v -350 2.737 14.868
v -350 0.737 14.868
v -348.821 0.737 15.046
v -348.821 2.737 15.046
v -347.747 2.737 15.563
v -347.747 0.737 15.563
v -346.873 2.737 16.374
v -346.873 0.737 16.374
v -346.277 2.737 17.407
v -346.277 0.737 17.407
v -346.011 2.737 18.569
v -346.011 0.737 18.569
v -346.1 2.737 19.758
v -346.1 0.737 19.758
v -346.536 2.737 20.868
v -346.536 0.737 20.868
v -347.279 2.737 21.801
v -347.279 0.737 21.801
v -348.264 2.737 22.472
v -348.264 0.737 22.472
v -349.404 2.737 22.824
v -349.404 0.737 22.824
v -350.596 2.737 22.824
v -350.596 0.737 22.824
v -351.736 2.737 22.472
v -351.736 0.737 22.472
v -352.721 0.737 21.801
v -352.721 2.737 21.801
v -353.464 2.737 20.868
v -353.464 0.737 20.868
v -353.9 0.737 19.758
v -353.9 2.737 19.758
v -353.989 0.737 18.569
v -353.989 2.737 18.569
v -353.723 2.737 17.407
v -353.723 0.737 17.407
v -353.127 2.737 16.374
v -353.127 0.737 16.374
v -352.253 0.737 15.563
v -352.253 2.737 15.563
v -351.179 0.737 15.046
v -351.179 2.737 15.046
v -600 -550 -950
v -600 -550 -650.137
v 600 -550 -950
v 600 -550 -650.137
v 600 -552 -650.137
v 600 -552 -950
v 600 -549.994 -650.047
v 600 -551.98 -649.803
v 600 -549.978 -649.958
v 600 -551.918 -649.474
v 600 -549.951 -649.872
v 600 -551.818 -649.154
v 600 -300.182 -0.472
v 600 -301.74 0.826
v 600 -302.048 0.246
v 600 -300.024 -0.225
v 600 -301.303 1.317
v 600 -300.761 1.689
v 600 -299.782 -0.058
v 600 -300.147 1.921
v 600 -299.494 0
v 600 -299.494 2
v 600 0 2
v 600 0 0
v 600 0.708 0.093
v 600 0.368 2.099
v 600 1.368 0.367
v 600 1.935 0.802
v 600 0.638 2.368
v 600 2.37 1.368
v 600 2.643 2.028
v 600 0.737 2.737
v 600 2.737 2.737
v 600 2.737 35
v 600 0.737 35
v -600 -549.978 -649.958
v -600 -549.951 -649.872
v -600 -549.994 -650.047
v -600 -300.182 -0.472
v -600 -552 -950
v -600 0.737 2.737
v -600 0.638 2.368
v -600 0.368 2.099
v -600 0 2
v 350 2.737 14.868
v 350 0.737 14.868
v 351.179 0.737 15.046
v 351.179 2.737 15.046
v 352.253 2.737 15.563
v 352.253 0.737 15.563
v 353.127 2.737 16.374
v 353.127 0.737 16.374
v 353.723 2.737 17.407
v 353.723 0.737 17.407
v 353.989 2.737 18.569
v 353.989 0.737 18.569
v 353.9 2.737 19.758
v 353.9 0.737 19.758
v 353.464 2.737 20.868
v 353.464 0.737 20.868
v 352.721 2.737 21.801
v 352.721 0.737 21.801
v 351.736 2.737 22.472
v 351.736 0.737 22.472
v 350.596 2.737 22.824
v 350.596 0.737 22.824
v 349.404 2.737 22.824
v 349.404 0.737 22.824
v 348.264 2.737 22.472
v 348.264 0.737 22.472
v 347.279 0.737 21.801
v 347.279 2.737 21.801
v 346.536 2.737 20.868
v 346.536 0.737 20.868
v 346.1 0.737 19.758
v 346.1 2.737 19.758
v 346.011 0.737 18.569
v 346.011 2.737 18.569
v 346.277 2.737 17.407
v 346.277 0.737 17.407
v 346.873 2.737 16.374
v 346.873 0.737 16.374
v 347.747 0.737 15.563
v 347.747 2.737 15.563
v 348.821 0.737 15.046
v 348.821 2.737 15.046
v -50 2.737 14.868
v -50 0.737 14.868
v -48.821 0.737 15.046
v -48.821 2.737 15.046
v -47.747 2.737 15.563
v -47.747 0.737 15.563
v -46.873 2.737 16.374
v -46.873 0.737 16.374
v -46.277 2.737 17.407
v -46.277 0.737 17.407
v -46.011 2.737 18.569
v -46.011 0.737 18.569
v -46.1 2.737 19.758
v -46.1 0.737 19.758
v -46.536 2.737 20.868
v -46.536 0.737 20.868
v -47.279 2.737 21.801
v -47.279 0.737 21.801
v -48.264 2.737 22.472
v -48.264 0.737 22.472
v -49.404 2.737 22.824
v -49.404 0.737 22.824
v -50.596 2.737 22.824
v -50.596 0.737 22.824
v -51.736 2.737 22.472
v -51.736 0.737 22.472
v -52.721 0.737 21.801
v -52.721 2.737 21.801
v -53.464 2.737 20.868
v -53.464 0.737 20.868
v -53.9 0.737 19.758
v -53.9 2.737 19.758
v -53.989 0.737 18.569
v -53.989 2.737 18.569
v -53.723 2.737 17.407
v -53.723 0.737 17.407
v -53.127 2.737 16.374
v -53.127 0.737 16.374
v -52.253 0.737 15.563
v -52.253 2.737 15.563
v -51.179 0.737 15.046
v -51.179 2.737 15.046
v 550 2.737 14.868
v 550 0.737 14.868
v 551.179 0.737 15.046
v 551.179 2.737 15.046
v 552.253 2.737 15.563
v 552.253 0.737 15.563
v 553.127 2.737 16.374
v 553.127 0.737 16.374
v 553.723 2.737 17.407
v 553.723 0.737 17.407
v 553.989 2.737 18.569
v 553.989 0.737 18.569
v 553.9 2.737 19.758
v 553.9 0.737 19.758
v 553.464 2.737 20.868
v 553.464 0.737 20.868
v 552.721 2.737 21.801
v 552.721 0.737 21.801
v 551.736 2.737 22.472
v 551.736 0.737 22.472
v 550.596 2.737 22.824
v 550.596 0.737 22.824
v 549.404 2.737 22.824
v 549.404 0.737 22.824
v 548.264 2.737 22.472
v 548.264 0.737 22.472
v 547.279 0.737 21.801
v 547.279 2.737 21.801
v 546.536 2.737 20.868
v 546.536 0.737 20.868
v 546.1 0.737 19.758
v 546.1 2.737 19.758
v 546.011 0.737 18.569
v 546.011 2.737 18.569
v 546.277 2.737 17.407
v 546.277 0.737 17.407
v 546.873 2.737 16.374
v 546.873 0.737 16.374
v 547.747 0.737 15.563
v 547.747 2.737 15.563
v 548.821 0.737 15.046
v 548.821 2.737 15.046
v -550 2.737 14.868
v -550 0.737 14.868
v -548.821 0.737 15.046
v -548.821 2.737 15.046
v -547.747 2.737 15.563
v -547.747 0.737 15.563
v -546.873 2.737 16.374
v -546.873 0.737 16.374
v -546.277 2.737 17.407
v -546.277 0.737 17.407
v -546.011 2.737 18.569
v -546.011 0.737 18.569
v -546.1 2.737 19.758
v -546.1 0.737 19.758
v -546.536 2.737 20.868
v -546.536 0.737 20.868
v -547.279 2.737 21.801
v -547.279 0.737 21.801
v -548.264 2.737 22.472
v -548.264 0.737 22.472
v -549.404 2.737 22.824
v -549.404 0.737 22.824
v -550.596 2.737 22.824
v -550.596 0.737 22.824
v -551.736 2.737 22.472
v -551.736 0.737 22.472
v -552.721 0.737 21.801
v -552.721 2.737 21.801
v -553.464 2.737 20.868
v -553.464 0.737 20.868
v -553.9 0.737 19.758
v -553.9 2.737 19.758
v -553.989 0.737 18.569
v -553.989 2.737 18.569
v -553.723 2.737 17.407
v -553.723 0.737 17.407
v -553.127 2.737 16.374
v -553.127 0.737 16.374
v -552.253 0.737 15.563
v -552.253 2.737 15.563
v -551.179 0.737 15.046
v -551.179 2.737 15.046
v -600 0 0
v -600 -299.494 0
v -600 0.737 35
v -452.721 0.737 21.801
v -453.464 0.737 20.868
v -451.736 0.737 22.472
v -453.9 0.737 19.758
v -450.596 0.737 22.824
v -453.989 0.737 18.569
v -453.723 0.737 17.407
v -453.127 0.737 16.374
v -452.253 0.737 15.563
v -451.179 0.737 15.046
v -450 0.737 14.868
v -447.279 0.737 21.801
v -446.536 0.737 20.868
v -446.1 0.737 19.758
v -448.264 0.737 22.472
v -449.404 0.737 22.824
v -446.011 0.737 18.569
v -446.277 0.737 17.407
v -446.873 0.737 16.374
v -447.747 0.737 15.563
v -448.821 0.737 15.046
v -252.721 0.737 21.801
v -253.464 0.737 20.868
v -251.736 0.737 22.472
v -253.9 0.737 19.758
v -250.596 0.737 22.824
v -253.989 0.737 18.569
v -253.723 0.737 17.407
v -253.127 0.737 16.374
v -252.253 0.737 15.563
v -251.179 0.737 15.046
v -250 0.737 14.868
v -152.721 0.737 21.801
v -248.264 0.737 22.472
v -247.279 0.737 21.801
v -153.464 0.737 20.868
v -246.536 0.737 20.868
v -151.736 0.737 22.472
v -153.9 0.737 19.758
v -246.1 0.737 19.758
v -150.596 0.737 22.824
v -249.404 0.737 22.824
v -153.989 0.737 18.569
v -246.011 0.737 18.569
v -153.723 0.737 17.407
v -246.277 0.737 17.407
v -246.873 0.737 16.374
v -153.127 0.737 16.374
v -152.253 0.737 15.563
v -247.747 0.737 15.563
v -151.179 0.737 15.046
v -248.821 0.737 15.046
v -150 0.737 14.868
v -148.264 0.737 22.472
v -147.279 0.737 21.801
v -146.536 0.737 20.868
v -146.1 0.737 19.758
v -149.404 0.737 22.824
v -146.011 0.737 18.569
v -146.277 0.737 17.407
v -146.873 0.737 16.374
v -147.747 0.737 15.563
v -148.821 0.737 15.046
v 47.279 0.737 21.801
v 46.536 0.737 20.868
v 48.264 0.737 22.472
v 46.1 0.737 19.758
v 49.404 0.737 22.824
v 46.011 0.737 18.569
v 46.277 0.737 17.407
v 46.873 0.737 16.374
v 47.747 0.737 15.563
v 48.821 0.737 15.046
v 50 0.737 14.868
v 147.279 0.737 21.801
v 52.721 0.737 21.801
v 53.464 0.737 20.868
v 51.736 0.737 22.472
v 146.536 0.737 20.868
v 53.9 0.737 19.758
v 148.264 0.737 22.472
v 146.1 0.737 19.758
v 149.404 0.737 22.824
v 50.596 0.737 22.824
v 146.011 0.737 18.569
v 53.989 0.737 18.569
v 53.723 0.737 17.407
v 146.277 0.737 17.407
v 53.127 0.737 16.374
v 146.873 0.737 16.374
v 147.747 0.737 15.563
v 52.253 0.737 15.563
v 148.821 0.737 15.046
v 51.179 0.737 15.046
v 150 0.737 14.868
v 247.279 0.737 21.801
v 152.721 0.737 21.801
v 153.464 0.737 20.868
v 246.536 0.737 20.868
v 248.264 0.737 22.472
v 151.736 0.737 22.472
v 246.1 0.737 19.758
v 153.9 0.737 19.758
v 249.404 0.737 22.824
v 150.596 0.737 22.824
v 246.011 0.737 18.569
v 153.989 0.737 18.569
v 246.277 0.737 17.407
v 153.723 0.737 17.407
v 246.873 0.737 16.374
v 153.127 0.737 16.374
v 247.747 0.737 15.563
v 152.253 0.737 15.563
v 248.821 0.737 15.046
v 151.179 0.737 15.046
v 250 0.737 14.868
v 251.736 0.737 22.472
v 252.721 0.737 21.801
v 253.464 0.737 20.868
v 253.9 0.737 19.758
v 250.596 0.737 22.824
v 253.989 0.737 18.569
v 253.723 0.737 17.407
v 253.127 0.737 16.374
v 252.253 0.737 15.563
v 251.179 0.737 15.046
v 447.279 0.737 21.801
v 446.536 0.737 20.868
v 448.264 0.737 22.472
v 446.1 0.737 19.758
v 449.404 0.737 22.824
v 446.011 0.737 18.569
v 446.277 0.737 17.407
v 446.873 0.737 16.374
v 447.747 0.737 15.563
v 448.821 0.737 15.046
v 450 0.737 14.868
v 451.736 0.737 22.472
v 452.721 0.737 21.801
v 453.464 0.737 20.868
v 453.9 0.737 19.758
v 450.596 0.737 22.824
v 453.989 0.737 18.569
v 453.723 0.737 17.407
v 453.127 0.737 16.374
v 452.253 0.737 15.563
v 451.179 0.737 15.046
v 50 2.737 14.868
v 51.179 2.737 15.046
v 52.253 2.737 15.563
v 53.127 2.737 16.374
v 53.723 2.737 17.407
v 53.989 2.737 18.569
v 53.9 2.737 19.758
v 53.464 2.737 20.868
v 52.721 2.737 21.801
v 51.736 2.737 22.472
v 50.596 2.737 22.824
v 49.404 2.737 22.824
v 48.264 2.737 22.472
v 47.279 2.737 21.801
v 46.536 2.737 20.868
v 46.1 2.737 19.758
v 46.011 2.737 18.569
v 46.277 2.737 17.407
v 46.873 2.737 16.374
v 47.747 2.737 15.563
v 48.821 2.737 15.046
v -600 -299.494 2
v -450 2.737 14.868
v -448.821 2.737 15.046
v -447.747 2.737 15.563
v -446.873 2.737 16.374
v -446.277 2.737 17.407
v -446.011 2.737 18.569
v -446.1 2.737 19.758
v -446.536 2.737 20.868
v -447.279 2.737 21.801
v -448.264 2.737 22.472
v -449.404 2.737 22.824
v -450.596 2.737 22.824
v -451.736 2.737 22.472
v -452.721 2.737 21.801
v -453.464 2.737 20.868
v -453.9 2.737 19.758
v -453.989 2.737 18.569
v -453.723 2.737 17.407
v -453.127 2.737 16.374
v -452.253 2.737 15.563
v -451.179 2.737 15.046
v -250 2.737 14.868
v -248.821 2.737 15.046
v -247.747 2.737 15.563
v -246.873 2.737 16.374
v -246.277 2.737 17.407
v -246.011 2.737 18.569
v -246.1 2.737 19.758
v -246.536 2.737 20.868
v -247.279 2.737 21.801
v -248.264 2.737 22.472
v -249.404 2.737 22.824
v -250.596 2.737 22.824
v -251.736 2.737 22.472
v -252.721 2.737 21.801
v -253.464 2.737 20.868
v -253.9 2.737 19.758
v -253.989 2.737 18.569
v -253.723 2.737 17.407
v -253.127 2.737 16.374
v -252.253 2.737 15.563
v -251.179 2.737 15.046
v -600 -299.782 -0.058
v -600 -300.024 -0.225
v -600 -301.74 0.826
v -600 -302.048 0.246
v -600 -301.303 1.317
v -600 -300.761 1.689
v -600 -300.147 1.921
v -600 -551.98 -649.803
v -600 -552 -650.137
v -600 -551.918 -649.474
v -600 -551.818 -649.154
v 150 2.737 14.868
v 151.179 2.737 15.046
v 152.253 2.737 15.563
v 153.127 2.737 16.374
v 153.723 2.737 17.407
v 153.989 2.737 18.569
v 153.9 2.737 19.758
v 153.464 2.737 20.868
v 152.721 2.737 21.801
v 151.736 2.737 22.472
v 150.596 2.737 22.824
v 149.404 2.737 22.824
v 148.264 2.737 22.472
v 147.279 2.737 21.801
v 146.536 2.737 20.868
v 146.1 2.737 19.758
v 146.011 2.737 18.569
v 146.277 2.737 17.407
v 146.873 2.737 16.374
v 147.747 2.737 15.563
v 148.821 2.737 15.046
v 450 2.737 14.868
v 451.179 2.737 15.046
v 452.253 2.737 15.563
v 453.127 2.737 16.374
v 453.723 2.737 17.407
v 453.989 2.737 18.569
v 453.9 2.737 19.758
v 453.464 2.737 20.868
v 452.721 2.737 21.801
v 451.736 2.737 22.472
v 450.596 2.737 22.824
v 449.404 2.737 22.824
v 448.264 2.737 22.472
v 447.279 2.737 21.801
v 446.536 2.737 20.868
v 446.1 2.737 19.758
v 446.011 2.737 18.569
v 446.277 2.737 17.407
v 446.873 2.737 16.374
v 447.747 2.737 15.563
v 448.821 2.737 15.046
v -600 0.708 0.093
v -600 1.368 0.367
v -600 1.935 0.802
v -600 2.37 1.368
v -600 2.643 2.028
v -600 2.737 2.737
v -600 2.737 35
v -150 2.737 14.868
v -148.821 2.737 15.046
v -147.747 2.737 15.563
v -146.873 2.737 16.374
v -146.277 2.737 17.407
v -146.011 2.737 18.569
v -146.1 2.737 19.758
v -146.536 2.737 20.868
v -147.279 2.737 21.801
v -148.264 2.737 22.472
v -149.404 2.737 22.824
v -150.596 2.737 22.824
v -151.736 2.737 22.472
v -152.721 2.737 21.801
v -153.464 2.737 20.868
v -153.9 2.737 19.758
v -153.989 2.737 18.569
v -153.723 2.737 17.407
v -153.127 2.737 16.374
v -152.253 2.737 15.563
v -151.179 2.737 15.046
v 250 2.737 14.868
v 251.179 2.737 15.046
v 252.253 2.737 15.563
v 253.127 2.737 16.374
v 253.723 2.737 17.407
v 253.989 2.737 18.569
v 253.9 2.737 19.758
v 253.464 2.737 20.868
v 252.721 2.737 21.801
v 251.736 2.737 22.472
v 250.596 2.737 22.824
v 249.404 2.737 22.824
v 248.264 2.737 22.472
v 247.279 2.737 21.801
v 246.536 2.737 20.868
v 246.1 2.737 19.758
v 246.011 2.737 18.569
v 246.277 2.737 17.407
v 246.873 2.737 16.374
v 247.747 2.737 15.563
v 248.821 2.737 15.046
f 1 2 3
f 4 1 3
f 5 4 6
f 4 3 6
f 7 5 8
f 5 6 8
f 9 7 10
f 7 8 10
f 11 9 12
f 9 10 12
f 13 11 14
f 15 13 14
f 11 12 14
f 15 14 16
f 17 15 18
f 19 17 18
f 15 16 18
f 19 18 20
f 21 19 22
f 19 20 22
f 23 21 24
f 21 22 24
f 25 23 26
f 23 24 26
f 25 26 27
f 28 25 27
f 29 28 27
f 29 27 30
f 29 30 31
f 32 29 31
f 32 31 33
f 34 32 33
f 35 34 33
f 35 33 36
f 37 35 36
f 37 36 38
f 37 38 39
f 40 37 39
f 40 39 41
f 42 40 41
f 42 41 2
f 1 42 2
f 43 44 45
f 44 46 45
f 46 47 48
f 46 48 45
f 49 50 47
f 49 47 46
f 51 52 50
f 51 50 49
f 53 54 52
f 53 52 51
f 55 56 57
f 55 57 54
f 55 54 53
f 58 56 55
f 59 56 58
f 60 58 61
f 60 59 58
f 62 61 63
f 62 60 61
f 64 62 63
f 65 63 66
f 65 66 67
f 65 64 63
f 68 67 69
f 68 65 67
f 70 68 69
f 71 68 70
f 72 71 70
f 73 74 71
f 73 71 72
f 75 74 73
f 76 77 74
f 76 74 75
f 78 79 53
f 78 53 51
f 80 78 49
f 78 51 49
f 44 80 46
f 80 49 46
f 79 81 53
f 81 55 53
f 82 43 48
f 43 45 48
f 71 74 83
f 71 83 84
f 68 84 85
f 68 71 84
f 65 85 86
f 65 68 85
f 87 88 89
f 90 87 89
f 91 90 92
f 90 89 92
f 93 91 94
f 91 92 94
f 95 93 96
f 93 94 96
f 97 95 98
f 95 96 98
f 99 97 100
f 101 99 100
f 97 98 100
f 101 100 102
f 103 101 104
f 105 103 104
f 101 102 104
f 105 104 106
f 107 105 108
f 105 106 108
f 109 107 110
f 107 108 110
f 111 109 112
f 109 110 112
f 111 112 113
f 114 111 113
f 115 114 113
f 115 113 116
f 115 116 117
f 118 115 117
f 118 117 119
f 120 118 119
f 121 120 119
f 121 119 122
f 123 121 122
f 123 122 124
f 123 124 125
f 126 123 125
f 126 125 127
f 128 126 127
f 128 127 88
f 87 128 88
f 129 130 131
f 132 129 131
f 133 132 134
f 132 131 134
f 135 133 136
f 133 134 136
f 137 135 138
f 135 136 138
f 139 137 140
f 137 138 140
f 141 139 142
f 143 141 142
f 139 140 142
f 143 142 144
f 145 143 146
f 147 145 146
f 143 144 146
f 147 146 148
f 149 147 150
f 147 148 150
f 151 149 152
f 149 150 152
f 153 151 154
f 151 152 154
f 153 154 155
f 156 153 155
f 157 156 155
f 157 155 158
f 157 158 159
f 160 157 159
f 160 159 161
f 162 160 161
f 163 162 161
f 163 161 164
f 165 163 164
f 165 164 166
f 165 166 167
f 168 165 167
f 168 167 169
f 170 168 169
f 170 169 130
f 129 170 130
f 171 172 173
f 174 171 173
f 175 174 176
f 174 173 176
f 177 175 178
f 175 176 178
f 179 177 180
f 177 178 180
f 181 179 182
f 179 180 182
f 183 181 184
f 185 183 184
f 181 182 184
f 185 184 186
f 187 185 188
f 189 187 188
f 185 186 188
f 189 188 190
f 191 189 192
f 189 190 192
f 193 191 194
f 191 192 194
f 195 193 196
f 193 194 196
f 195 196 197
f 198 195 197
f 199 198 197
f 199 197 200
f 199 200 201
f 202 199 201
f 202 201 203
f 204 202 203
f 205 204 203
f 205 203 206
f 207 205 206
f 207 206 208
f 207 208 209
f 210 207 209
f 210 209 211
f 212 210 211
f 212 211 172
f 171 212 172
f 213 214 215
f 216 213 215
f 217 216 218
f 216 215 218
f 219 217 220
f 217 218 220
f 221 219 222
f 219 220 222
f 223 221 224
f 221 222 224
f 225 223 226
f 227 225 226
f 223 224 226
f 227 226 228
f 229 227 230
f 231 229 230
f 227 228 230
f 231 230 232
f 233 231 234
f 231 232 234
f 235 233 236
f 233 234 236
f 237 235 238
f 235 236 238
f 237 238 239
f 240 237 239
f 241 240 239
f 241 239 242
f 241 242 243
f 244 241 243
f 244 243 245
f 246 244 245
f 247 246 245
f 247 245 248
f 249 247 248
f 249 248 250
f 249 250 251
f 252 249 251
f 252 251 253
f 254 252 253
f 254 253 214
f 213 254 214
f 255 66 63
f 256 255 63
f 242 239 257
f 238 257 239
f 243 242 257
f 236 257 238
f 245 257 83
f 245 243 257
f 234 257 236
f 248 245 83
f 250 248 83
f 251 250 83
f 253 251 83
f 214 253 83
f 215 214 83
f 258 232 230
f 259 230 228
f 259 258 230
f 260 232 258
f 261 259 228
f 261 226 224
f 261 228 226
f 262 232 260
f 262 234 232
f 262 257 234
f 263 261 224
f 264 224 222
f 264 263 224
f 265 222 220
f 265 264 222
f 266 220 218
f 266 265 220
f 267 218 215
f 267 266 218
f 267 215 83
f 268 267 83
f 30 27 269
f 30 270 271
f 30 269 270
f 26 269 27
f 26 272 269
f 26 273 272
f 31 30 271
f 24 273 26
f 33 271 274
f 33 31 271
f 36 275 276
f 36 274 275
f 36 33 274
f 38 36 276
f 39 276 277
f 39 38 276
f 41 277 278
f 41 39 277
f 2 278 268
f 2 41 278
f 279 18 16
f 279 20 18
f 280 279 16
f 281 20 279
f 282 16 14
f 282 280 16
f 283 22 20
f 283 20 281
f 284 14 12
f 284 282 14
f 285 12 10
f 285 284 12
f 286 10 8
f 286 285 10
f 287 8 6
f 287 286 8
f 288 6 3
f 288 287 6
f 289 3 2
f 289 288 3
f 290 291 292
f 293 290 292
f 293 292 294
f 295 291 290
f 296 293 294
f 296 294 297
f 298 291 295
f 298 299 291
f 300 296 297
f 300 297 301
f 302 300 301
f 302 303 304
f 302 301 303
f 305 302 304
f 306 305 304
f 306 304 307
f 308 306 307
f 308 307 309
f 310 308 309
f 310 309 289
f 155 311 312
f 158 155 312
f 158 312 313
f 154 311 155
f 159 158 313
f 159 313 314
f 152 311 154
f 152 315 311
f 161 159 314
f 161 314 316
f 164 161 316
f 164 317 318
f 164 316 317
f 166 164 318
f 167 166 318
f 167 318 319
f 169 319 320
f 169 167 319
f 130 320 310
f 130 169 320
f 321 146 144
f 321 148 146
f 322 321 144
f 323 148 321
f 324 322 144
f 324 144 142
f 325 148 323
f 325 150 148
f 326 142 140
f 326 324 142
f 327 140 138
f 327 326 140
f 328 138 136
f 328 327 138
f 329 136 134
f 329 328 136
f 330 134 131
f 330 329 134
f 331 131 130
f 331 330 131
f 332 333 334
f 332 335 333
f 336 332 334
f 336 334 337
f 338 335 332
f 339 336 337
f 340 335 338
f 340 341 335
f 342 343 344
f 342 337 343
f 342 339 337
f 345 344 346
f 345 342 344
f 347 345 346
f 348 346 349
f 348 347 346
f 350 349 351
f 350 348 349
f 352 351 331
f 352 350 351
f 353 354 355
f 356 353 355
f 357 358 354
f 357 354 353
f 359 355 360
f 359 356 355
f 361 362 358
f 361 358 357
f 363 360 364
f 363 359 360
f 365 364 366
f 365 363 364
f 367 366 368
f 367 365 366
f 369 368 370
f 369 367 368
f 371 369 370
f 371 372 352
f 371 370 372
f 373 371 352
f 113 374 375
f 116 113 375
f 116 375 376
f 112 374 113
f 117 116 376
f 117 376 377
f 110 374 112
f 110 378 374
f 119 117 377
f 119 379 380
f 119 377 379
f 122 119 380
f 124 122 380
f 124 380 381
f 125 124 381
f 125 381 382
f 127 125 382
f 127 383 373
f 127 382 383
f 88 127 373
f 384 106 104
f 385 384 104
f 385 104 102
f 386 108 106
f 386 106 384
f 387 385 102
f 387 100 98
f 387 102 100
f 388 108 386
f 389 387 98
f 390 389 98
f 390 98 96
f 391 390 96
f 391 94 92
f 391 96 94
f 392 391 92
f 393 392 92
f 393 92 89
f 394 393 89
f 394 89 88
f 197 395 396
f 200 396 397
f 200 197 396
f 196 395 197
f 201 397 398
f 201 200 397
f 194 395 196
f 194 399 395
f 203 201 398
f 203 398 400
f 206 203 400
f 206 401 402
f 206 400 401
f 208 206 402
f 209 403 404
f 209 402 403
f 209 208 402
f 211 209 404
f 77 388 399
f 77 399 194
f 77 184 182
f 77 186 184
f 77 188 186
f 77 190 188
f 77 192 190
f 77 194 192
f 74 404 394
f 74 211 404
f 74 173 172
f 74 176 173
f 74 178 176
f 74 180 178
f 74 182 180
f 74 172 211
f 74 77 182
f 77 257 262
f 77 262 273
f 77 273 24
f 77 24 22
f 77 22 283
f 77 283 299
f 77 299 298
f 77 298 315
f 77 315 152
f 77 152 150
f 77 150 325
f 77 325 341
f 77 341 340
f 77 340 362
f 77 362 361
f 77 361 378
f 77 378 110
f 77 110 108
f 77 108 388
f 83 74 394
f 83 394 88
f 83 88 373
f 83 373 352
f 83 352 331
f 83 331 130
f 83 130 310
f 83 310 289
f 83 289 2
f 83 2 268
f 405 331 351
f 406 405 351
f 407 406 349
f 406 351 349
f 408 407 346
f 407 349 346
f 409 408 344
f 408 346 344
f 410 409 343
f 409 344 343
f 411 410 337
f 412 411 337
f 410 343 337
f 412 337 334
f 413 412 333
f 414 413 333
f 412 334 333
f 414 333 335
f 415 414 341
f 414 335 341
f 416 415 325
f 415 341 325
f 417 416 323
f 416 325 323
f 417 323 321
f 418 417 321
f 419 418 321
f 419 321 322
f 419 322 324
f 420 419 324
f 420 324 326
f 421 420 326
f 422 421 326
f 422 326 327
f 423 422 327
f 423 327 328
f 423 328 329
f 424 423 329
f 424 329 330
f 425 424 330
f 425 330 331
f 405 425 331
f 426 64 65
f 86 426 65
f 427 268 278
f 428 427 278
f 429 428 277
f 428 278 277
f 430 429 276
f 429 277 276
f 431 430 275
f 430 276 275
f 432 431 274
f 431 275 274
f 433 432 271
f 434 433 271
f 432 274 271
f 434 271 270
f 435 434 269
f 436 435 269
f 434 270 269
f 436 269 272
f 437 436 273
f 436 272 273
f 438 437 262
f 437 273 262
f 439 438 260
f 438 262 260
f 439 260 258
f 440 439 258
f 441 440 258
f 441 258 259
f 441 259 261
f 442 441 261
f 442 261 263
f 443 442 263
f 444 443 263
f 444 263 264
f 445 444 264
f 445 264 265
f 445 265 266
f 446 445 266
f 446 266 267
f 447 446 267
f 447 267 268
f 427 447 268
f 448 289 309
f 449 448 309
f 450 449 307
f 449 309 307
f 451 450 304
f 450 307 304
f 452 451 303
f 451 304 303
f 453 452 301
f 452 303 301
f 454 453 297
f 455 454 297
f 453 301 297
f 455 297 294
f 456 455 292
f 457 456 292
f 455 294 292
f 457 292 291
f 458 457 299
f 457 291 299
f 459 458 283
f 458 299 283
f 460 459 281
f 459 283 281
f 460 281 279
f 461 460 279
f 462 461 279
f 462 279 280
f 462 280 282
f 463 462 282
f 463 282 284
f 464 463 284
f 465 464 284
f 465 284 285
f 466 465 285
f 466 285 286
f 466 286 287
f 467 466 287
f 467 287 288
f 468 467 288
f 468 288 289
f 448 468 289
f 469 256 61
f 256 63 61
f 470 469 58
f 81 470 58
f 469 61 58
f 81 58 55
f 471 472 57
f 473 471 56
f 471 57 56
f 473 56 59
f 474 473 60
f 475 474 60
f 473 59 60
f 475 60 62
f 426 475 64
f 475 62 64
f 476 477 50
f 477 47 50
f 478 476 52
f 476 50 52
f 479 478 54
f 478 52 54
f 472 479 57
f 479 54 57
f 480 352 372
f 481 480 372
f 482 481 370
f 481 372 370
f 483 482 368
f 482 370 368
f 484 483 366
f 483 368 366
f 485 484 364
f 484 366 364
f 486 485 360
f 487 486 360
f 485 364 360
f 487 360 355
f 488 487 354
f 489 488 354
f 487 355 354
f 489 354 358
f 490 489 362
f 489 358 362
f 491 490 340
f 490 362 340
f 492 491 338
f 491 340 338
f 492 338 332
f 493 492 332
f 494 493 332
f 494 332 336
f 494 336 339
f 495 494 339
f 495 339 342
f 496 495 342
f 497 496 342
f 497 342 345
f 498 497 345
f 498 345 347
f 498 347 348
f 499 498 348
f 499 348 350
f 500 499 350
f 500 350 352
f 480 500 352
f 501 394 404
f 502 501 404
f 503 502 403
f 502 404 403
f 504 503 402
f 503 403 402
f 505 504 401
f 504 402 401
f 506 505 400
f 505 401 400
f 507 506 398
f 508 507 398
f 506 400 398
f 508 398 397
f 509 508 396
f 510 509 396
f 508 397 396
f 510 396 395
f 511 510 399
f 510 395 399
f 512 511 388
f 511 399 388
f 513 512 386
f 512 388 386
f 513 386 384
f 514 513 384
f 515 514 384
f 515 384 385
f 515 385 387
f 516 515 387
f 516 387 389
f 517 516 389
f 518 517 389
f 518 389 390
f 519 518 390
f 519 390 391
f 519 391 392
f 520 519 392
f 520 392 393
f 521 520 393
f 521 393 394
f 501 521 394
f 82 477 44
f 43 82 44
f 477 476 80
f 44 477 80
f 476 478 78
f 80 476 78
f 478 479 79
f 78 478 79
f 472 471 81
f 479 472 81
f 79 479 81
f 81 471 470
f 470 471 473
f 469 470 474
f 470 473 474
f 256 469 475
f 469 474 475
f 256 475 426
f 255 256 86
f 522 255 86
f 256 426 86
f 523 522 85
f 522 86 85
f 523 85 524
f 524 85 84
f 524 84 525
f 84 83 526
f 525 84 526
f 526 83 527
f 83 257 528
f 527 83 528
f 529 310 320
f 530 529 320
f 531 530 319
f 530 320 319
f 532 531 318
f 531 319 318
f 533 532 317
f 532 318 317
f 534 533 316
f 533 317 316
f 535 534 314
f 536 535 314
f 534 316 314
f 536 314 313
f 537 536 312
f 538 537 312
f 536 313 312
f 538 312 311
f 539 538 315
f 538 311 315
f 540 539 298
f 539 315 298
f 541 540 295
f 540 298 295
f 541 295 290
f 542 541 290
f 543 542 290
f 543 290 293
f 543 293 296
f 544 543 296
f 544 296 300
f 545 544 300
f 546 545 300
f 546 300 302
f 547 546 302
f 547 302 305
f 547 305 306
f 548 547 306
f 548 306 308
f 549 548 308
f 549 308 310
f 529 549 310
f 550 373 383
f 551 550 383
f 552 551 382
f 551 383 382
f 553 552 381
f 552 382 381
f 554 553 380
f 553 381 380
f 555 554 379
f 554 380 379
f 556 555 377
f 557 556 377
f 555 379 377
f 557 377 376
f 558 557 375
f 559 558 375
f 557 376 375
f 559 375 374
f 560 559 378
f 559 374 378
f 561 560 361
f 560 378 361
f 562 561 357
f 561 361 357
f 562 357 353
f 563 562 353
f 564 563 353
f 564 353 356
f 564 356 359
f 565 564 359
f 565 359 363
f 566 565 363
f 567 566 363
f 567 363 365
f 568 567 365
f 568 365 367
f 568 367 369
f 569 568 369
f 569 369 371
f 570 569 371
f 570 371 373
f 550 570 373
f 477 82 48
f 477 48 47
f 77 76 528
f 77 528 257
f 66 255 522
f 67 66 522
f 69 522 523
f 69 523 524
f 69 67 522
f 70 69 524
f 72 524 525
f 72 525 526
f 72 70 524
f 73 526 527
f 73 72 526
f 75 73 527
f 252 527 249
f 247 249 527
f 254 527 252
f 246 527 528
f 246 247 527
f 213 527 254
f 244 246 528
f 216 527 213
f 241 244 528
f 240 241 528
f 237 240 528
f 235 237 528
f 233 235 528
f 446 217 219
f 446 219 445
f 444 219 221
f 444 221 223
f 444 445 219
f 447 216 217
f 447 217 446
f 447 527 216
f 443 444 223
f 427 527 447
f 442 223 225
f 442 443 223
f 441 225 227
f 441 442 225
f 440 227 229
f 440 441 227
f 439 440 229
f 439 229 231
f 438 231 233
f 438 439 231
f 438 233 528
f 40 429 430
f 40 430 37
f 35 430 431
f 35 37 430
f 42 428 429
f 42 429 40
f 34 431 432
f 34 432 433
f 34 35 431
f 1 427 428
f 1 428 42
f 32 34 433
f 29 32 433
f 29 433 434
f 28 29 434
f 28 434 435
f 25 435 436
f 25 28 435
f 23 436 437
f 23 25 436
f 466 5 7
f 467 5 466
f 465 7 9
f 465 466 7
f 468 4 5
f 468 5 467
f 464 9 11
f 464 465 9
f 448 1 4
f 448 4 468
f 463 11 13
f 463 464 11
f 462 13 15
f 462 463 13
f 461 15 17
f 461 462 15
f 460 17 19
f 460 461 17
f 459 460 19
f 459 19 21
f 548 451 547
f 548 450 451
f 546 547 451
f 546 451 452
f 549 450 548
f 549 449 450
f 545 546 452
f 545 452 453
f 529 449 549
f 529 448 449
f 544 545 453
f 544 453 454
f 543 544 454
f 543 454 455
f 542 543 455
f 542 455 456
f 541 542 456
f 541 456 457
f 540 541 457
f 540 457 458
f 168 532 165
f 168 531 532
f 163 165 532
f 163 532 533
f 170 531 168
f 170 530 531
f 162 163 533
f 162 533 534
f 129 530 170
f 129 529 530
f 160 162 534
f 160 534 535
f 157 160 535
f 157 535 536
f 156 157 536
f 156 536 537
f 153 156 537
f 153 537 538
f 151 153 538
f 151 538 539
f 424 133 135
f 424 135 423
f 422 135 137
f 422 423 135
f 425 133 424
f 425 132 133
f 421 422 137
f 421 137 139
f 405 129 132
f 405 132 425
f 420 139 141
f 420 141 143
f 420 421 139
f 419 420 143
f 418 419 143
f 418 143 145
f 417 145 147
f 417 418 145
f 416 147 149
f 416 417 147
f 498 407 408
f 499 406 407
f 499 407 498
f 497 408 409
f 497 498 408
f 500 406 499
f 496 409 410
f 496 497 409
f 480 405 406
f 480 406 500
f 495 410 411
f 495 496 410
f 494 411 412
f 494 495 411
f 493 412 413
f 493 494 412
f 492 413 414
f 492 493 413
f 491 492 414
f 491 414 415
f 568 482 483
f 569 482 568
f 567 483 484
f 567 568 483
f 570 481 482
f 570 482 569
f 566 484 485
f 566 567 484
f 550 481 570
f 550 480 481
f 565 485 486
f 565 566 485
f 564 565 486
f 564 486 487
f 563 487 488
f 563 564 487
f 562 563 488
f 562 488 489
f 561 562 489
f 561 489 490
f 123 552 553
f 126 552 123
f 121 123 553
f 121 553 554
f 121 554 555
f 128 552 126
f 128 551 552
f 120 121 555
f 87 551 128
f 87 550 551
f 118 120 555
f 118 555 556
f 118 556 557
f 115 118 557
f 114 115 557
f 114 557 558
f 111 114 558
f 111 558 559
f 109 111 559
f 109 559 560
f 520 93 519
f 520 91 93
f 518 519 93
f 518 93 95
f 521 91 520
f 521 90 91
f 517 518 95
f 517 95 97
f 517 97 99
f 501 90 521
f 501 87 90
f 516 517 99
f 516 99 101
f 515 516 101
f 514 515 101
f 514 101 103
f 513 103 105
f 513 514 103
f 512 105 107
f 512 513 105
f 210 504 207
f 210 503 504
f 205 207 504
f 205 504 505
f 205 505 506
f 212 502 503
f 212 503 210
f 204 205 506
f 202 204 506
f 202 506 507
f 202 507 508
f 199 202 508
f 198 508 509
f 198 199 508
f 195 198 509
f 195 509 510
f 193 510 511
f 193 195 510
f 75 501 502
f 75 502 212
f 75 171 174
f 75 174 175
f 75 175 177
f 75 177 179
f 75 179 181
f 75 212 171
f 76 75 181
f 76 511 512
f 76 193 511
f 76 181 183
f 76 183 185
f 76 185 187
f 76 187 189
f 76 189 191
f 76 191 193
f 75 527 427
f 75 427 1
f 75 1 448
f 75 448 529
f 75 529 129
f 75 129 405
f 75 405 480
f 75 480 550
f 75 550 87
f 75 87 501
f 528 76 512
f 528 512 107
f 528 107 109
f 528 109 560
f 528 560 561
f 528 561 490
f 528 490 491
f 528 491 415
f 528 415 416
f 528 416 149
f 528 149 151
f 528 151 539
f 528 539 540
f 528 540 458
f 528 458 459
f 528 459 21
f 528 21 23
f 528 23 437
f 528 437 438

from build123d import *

# Parameters (mm, degrees)
BASE_FLANGE1_DEPTH = 600
EDGE_FLANGE1_DEPTH = 1200
SKETCH7_R          = 4
CUT_EXTRUDE1_DEPTH = 10


# Sheet-metal steps are written as plain solids
with BuildPart() as part:
    # Sketch1 → Base-Flange1 (new, symmetric)
    with BuildSketch(Plane(origin=(0, 0, 0), x_dir=(0, 0, -1), z_dir=(1, 0, 0))):
        with BuildLine():
            Line((0, 0), (0, -299.494103784))
            ThreePointArc((0, -299.494103784), (0.129412109, -299.911119881), (0.47217601, -300.181606158))
            Line((0.47217601, -300.181606158), (649.872346171, -549.950902374))
            ThreePointArc((649.872346171, -549.950902374), (650.002298395, -549.987621585), (650.136770161, -550))
            Line((650.136770161, -550), (950, -550))
            Line((950, -550), (950, -552))
            Line((950, -552), (650.136717071, -552))
            ThreePointArc((650.136717071, -552), (649.637152182, -551.954006147), (649.154377846, -551.817589676))
            Line((649.154377846, -551.817589676), (-0.245782148, -302.04829737))
            ThreePointArc((-0.245782148, -302.04829737), (-1.519211001, -301.043392746), (-2, -299.494103784))
            Line((-2, -299.494103784), (-2, 0))
            Line((-2, 0), (0, 0))
        make_face()
    extrude(amount=BASE_FLANGE1_DEPTH, both=True)

    # Edge-Flange1 section (across the edge) → Edge-Flange1 (add)
    with BuildSketch(Plane(origin=(600, 0.7366, 2), x_dir=(0, -1, 0), z_dir=(-1, 0, 0))):
        with BuildLine():
            Line((-2, 0.7366), (-2, 33))
            Line((-2, 33), (0, 33))
            Line((0, 33), (0, 0.7366))
            ThreePointArc((0, 0.7366), (0.215745145, 0.215745145), (0.7366, 0))
            Line((0.7366, 0), (0.7366, -2))
            ThreePointArc((0.7366, -2), (-1.198468417, -1.198468417), (-2, 0.7366))
        make_face()
    extrude(amount=EDGE_FLANGE1_DEPTH)

    # Sketch7 → Cut-Extrude1 (cut)
    with BuildSketch(Plane.XZ.offset(-0.7366)):
        with Locations(Location((-550, 18.8683, 0), (0, 0, 270))):
            Circle(SKETCH7_R)
        with Locations(Location((-450, 18.8683, 0), (0, 0, 270))):
            Circle(SKETCH7_R)
        with Locations(Location((-350, 18.8683, 0), (0, 0, 270))):
            Circle(SKETCH7_R)
        with Locations(Location((-250, 18.8683, 0), (0, 0, 270))):
            Circle(SKETCH7_R)
        with Locations(Location((-150, 18.8683, 0), (0, 0, 270))):
            Circle(SKETCH7_R)
        with Locations(Location((-50, 18.8683, 0), (0, 0, 270))):
            Circle(SKETCH7_R)
        with Locations(Location((50, 18.8683, 0), (0, 0, 270))):
            Circle(SKETCH7_R)
        with Locations(Location((150, 18.8683, 0), (0, 0, 270))):
            Circle(SKETCH7_R)
        with Locations(Location((250, 18.8683, 0), (0, 0, 270))):
            Circle(SKETCH7_R)
        with Locations(Location((350, 18.8683, 0), (0, 0, 270))):
            Circle(SKETCH7_R)
        with Locations(Location((450, 18.8683, 0), (0, 0, 270))):
            Circle(SKETCH7_R)
        with Locations(Location((550, 18.8683, 0), (0, 0, 270))):
            Circle(SKETCH7_R)
    extrude(amount=-CUT_EXTRUDE1_DEPTH, mode=Mode.SUBTRACT)


solid = part.part
